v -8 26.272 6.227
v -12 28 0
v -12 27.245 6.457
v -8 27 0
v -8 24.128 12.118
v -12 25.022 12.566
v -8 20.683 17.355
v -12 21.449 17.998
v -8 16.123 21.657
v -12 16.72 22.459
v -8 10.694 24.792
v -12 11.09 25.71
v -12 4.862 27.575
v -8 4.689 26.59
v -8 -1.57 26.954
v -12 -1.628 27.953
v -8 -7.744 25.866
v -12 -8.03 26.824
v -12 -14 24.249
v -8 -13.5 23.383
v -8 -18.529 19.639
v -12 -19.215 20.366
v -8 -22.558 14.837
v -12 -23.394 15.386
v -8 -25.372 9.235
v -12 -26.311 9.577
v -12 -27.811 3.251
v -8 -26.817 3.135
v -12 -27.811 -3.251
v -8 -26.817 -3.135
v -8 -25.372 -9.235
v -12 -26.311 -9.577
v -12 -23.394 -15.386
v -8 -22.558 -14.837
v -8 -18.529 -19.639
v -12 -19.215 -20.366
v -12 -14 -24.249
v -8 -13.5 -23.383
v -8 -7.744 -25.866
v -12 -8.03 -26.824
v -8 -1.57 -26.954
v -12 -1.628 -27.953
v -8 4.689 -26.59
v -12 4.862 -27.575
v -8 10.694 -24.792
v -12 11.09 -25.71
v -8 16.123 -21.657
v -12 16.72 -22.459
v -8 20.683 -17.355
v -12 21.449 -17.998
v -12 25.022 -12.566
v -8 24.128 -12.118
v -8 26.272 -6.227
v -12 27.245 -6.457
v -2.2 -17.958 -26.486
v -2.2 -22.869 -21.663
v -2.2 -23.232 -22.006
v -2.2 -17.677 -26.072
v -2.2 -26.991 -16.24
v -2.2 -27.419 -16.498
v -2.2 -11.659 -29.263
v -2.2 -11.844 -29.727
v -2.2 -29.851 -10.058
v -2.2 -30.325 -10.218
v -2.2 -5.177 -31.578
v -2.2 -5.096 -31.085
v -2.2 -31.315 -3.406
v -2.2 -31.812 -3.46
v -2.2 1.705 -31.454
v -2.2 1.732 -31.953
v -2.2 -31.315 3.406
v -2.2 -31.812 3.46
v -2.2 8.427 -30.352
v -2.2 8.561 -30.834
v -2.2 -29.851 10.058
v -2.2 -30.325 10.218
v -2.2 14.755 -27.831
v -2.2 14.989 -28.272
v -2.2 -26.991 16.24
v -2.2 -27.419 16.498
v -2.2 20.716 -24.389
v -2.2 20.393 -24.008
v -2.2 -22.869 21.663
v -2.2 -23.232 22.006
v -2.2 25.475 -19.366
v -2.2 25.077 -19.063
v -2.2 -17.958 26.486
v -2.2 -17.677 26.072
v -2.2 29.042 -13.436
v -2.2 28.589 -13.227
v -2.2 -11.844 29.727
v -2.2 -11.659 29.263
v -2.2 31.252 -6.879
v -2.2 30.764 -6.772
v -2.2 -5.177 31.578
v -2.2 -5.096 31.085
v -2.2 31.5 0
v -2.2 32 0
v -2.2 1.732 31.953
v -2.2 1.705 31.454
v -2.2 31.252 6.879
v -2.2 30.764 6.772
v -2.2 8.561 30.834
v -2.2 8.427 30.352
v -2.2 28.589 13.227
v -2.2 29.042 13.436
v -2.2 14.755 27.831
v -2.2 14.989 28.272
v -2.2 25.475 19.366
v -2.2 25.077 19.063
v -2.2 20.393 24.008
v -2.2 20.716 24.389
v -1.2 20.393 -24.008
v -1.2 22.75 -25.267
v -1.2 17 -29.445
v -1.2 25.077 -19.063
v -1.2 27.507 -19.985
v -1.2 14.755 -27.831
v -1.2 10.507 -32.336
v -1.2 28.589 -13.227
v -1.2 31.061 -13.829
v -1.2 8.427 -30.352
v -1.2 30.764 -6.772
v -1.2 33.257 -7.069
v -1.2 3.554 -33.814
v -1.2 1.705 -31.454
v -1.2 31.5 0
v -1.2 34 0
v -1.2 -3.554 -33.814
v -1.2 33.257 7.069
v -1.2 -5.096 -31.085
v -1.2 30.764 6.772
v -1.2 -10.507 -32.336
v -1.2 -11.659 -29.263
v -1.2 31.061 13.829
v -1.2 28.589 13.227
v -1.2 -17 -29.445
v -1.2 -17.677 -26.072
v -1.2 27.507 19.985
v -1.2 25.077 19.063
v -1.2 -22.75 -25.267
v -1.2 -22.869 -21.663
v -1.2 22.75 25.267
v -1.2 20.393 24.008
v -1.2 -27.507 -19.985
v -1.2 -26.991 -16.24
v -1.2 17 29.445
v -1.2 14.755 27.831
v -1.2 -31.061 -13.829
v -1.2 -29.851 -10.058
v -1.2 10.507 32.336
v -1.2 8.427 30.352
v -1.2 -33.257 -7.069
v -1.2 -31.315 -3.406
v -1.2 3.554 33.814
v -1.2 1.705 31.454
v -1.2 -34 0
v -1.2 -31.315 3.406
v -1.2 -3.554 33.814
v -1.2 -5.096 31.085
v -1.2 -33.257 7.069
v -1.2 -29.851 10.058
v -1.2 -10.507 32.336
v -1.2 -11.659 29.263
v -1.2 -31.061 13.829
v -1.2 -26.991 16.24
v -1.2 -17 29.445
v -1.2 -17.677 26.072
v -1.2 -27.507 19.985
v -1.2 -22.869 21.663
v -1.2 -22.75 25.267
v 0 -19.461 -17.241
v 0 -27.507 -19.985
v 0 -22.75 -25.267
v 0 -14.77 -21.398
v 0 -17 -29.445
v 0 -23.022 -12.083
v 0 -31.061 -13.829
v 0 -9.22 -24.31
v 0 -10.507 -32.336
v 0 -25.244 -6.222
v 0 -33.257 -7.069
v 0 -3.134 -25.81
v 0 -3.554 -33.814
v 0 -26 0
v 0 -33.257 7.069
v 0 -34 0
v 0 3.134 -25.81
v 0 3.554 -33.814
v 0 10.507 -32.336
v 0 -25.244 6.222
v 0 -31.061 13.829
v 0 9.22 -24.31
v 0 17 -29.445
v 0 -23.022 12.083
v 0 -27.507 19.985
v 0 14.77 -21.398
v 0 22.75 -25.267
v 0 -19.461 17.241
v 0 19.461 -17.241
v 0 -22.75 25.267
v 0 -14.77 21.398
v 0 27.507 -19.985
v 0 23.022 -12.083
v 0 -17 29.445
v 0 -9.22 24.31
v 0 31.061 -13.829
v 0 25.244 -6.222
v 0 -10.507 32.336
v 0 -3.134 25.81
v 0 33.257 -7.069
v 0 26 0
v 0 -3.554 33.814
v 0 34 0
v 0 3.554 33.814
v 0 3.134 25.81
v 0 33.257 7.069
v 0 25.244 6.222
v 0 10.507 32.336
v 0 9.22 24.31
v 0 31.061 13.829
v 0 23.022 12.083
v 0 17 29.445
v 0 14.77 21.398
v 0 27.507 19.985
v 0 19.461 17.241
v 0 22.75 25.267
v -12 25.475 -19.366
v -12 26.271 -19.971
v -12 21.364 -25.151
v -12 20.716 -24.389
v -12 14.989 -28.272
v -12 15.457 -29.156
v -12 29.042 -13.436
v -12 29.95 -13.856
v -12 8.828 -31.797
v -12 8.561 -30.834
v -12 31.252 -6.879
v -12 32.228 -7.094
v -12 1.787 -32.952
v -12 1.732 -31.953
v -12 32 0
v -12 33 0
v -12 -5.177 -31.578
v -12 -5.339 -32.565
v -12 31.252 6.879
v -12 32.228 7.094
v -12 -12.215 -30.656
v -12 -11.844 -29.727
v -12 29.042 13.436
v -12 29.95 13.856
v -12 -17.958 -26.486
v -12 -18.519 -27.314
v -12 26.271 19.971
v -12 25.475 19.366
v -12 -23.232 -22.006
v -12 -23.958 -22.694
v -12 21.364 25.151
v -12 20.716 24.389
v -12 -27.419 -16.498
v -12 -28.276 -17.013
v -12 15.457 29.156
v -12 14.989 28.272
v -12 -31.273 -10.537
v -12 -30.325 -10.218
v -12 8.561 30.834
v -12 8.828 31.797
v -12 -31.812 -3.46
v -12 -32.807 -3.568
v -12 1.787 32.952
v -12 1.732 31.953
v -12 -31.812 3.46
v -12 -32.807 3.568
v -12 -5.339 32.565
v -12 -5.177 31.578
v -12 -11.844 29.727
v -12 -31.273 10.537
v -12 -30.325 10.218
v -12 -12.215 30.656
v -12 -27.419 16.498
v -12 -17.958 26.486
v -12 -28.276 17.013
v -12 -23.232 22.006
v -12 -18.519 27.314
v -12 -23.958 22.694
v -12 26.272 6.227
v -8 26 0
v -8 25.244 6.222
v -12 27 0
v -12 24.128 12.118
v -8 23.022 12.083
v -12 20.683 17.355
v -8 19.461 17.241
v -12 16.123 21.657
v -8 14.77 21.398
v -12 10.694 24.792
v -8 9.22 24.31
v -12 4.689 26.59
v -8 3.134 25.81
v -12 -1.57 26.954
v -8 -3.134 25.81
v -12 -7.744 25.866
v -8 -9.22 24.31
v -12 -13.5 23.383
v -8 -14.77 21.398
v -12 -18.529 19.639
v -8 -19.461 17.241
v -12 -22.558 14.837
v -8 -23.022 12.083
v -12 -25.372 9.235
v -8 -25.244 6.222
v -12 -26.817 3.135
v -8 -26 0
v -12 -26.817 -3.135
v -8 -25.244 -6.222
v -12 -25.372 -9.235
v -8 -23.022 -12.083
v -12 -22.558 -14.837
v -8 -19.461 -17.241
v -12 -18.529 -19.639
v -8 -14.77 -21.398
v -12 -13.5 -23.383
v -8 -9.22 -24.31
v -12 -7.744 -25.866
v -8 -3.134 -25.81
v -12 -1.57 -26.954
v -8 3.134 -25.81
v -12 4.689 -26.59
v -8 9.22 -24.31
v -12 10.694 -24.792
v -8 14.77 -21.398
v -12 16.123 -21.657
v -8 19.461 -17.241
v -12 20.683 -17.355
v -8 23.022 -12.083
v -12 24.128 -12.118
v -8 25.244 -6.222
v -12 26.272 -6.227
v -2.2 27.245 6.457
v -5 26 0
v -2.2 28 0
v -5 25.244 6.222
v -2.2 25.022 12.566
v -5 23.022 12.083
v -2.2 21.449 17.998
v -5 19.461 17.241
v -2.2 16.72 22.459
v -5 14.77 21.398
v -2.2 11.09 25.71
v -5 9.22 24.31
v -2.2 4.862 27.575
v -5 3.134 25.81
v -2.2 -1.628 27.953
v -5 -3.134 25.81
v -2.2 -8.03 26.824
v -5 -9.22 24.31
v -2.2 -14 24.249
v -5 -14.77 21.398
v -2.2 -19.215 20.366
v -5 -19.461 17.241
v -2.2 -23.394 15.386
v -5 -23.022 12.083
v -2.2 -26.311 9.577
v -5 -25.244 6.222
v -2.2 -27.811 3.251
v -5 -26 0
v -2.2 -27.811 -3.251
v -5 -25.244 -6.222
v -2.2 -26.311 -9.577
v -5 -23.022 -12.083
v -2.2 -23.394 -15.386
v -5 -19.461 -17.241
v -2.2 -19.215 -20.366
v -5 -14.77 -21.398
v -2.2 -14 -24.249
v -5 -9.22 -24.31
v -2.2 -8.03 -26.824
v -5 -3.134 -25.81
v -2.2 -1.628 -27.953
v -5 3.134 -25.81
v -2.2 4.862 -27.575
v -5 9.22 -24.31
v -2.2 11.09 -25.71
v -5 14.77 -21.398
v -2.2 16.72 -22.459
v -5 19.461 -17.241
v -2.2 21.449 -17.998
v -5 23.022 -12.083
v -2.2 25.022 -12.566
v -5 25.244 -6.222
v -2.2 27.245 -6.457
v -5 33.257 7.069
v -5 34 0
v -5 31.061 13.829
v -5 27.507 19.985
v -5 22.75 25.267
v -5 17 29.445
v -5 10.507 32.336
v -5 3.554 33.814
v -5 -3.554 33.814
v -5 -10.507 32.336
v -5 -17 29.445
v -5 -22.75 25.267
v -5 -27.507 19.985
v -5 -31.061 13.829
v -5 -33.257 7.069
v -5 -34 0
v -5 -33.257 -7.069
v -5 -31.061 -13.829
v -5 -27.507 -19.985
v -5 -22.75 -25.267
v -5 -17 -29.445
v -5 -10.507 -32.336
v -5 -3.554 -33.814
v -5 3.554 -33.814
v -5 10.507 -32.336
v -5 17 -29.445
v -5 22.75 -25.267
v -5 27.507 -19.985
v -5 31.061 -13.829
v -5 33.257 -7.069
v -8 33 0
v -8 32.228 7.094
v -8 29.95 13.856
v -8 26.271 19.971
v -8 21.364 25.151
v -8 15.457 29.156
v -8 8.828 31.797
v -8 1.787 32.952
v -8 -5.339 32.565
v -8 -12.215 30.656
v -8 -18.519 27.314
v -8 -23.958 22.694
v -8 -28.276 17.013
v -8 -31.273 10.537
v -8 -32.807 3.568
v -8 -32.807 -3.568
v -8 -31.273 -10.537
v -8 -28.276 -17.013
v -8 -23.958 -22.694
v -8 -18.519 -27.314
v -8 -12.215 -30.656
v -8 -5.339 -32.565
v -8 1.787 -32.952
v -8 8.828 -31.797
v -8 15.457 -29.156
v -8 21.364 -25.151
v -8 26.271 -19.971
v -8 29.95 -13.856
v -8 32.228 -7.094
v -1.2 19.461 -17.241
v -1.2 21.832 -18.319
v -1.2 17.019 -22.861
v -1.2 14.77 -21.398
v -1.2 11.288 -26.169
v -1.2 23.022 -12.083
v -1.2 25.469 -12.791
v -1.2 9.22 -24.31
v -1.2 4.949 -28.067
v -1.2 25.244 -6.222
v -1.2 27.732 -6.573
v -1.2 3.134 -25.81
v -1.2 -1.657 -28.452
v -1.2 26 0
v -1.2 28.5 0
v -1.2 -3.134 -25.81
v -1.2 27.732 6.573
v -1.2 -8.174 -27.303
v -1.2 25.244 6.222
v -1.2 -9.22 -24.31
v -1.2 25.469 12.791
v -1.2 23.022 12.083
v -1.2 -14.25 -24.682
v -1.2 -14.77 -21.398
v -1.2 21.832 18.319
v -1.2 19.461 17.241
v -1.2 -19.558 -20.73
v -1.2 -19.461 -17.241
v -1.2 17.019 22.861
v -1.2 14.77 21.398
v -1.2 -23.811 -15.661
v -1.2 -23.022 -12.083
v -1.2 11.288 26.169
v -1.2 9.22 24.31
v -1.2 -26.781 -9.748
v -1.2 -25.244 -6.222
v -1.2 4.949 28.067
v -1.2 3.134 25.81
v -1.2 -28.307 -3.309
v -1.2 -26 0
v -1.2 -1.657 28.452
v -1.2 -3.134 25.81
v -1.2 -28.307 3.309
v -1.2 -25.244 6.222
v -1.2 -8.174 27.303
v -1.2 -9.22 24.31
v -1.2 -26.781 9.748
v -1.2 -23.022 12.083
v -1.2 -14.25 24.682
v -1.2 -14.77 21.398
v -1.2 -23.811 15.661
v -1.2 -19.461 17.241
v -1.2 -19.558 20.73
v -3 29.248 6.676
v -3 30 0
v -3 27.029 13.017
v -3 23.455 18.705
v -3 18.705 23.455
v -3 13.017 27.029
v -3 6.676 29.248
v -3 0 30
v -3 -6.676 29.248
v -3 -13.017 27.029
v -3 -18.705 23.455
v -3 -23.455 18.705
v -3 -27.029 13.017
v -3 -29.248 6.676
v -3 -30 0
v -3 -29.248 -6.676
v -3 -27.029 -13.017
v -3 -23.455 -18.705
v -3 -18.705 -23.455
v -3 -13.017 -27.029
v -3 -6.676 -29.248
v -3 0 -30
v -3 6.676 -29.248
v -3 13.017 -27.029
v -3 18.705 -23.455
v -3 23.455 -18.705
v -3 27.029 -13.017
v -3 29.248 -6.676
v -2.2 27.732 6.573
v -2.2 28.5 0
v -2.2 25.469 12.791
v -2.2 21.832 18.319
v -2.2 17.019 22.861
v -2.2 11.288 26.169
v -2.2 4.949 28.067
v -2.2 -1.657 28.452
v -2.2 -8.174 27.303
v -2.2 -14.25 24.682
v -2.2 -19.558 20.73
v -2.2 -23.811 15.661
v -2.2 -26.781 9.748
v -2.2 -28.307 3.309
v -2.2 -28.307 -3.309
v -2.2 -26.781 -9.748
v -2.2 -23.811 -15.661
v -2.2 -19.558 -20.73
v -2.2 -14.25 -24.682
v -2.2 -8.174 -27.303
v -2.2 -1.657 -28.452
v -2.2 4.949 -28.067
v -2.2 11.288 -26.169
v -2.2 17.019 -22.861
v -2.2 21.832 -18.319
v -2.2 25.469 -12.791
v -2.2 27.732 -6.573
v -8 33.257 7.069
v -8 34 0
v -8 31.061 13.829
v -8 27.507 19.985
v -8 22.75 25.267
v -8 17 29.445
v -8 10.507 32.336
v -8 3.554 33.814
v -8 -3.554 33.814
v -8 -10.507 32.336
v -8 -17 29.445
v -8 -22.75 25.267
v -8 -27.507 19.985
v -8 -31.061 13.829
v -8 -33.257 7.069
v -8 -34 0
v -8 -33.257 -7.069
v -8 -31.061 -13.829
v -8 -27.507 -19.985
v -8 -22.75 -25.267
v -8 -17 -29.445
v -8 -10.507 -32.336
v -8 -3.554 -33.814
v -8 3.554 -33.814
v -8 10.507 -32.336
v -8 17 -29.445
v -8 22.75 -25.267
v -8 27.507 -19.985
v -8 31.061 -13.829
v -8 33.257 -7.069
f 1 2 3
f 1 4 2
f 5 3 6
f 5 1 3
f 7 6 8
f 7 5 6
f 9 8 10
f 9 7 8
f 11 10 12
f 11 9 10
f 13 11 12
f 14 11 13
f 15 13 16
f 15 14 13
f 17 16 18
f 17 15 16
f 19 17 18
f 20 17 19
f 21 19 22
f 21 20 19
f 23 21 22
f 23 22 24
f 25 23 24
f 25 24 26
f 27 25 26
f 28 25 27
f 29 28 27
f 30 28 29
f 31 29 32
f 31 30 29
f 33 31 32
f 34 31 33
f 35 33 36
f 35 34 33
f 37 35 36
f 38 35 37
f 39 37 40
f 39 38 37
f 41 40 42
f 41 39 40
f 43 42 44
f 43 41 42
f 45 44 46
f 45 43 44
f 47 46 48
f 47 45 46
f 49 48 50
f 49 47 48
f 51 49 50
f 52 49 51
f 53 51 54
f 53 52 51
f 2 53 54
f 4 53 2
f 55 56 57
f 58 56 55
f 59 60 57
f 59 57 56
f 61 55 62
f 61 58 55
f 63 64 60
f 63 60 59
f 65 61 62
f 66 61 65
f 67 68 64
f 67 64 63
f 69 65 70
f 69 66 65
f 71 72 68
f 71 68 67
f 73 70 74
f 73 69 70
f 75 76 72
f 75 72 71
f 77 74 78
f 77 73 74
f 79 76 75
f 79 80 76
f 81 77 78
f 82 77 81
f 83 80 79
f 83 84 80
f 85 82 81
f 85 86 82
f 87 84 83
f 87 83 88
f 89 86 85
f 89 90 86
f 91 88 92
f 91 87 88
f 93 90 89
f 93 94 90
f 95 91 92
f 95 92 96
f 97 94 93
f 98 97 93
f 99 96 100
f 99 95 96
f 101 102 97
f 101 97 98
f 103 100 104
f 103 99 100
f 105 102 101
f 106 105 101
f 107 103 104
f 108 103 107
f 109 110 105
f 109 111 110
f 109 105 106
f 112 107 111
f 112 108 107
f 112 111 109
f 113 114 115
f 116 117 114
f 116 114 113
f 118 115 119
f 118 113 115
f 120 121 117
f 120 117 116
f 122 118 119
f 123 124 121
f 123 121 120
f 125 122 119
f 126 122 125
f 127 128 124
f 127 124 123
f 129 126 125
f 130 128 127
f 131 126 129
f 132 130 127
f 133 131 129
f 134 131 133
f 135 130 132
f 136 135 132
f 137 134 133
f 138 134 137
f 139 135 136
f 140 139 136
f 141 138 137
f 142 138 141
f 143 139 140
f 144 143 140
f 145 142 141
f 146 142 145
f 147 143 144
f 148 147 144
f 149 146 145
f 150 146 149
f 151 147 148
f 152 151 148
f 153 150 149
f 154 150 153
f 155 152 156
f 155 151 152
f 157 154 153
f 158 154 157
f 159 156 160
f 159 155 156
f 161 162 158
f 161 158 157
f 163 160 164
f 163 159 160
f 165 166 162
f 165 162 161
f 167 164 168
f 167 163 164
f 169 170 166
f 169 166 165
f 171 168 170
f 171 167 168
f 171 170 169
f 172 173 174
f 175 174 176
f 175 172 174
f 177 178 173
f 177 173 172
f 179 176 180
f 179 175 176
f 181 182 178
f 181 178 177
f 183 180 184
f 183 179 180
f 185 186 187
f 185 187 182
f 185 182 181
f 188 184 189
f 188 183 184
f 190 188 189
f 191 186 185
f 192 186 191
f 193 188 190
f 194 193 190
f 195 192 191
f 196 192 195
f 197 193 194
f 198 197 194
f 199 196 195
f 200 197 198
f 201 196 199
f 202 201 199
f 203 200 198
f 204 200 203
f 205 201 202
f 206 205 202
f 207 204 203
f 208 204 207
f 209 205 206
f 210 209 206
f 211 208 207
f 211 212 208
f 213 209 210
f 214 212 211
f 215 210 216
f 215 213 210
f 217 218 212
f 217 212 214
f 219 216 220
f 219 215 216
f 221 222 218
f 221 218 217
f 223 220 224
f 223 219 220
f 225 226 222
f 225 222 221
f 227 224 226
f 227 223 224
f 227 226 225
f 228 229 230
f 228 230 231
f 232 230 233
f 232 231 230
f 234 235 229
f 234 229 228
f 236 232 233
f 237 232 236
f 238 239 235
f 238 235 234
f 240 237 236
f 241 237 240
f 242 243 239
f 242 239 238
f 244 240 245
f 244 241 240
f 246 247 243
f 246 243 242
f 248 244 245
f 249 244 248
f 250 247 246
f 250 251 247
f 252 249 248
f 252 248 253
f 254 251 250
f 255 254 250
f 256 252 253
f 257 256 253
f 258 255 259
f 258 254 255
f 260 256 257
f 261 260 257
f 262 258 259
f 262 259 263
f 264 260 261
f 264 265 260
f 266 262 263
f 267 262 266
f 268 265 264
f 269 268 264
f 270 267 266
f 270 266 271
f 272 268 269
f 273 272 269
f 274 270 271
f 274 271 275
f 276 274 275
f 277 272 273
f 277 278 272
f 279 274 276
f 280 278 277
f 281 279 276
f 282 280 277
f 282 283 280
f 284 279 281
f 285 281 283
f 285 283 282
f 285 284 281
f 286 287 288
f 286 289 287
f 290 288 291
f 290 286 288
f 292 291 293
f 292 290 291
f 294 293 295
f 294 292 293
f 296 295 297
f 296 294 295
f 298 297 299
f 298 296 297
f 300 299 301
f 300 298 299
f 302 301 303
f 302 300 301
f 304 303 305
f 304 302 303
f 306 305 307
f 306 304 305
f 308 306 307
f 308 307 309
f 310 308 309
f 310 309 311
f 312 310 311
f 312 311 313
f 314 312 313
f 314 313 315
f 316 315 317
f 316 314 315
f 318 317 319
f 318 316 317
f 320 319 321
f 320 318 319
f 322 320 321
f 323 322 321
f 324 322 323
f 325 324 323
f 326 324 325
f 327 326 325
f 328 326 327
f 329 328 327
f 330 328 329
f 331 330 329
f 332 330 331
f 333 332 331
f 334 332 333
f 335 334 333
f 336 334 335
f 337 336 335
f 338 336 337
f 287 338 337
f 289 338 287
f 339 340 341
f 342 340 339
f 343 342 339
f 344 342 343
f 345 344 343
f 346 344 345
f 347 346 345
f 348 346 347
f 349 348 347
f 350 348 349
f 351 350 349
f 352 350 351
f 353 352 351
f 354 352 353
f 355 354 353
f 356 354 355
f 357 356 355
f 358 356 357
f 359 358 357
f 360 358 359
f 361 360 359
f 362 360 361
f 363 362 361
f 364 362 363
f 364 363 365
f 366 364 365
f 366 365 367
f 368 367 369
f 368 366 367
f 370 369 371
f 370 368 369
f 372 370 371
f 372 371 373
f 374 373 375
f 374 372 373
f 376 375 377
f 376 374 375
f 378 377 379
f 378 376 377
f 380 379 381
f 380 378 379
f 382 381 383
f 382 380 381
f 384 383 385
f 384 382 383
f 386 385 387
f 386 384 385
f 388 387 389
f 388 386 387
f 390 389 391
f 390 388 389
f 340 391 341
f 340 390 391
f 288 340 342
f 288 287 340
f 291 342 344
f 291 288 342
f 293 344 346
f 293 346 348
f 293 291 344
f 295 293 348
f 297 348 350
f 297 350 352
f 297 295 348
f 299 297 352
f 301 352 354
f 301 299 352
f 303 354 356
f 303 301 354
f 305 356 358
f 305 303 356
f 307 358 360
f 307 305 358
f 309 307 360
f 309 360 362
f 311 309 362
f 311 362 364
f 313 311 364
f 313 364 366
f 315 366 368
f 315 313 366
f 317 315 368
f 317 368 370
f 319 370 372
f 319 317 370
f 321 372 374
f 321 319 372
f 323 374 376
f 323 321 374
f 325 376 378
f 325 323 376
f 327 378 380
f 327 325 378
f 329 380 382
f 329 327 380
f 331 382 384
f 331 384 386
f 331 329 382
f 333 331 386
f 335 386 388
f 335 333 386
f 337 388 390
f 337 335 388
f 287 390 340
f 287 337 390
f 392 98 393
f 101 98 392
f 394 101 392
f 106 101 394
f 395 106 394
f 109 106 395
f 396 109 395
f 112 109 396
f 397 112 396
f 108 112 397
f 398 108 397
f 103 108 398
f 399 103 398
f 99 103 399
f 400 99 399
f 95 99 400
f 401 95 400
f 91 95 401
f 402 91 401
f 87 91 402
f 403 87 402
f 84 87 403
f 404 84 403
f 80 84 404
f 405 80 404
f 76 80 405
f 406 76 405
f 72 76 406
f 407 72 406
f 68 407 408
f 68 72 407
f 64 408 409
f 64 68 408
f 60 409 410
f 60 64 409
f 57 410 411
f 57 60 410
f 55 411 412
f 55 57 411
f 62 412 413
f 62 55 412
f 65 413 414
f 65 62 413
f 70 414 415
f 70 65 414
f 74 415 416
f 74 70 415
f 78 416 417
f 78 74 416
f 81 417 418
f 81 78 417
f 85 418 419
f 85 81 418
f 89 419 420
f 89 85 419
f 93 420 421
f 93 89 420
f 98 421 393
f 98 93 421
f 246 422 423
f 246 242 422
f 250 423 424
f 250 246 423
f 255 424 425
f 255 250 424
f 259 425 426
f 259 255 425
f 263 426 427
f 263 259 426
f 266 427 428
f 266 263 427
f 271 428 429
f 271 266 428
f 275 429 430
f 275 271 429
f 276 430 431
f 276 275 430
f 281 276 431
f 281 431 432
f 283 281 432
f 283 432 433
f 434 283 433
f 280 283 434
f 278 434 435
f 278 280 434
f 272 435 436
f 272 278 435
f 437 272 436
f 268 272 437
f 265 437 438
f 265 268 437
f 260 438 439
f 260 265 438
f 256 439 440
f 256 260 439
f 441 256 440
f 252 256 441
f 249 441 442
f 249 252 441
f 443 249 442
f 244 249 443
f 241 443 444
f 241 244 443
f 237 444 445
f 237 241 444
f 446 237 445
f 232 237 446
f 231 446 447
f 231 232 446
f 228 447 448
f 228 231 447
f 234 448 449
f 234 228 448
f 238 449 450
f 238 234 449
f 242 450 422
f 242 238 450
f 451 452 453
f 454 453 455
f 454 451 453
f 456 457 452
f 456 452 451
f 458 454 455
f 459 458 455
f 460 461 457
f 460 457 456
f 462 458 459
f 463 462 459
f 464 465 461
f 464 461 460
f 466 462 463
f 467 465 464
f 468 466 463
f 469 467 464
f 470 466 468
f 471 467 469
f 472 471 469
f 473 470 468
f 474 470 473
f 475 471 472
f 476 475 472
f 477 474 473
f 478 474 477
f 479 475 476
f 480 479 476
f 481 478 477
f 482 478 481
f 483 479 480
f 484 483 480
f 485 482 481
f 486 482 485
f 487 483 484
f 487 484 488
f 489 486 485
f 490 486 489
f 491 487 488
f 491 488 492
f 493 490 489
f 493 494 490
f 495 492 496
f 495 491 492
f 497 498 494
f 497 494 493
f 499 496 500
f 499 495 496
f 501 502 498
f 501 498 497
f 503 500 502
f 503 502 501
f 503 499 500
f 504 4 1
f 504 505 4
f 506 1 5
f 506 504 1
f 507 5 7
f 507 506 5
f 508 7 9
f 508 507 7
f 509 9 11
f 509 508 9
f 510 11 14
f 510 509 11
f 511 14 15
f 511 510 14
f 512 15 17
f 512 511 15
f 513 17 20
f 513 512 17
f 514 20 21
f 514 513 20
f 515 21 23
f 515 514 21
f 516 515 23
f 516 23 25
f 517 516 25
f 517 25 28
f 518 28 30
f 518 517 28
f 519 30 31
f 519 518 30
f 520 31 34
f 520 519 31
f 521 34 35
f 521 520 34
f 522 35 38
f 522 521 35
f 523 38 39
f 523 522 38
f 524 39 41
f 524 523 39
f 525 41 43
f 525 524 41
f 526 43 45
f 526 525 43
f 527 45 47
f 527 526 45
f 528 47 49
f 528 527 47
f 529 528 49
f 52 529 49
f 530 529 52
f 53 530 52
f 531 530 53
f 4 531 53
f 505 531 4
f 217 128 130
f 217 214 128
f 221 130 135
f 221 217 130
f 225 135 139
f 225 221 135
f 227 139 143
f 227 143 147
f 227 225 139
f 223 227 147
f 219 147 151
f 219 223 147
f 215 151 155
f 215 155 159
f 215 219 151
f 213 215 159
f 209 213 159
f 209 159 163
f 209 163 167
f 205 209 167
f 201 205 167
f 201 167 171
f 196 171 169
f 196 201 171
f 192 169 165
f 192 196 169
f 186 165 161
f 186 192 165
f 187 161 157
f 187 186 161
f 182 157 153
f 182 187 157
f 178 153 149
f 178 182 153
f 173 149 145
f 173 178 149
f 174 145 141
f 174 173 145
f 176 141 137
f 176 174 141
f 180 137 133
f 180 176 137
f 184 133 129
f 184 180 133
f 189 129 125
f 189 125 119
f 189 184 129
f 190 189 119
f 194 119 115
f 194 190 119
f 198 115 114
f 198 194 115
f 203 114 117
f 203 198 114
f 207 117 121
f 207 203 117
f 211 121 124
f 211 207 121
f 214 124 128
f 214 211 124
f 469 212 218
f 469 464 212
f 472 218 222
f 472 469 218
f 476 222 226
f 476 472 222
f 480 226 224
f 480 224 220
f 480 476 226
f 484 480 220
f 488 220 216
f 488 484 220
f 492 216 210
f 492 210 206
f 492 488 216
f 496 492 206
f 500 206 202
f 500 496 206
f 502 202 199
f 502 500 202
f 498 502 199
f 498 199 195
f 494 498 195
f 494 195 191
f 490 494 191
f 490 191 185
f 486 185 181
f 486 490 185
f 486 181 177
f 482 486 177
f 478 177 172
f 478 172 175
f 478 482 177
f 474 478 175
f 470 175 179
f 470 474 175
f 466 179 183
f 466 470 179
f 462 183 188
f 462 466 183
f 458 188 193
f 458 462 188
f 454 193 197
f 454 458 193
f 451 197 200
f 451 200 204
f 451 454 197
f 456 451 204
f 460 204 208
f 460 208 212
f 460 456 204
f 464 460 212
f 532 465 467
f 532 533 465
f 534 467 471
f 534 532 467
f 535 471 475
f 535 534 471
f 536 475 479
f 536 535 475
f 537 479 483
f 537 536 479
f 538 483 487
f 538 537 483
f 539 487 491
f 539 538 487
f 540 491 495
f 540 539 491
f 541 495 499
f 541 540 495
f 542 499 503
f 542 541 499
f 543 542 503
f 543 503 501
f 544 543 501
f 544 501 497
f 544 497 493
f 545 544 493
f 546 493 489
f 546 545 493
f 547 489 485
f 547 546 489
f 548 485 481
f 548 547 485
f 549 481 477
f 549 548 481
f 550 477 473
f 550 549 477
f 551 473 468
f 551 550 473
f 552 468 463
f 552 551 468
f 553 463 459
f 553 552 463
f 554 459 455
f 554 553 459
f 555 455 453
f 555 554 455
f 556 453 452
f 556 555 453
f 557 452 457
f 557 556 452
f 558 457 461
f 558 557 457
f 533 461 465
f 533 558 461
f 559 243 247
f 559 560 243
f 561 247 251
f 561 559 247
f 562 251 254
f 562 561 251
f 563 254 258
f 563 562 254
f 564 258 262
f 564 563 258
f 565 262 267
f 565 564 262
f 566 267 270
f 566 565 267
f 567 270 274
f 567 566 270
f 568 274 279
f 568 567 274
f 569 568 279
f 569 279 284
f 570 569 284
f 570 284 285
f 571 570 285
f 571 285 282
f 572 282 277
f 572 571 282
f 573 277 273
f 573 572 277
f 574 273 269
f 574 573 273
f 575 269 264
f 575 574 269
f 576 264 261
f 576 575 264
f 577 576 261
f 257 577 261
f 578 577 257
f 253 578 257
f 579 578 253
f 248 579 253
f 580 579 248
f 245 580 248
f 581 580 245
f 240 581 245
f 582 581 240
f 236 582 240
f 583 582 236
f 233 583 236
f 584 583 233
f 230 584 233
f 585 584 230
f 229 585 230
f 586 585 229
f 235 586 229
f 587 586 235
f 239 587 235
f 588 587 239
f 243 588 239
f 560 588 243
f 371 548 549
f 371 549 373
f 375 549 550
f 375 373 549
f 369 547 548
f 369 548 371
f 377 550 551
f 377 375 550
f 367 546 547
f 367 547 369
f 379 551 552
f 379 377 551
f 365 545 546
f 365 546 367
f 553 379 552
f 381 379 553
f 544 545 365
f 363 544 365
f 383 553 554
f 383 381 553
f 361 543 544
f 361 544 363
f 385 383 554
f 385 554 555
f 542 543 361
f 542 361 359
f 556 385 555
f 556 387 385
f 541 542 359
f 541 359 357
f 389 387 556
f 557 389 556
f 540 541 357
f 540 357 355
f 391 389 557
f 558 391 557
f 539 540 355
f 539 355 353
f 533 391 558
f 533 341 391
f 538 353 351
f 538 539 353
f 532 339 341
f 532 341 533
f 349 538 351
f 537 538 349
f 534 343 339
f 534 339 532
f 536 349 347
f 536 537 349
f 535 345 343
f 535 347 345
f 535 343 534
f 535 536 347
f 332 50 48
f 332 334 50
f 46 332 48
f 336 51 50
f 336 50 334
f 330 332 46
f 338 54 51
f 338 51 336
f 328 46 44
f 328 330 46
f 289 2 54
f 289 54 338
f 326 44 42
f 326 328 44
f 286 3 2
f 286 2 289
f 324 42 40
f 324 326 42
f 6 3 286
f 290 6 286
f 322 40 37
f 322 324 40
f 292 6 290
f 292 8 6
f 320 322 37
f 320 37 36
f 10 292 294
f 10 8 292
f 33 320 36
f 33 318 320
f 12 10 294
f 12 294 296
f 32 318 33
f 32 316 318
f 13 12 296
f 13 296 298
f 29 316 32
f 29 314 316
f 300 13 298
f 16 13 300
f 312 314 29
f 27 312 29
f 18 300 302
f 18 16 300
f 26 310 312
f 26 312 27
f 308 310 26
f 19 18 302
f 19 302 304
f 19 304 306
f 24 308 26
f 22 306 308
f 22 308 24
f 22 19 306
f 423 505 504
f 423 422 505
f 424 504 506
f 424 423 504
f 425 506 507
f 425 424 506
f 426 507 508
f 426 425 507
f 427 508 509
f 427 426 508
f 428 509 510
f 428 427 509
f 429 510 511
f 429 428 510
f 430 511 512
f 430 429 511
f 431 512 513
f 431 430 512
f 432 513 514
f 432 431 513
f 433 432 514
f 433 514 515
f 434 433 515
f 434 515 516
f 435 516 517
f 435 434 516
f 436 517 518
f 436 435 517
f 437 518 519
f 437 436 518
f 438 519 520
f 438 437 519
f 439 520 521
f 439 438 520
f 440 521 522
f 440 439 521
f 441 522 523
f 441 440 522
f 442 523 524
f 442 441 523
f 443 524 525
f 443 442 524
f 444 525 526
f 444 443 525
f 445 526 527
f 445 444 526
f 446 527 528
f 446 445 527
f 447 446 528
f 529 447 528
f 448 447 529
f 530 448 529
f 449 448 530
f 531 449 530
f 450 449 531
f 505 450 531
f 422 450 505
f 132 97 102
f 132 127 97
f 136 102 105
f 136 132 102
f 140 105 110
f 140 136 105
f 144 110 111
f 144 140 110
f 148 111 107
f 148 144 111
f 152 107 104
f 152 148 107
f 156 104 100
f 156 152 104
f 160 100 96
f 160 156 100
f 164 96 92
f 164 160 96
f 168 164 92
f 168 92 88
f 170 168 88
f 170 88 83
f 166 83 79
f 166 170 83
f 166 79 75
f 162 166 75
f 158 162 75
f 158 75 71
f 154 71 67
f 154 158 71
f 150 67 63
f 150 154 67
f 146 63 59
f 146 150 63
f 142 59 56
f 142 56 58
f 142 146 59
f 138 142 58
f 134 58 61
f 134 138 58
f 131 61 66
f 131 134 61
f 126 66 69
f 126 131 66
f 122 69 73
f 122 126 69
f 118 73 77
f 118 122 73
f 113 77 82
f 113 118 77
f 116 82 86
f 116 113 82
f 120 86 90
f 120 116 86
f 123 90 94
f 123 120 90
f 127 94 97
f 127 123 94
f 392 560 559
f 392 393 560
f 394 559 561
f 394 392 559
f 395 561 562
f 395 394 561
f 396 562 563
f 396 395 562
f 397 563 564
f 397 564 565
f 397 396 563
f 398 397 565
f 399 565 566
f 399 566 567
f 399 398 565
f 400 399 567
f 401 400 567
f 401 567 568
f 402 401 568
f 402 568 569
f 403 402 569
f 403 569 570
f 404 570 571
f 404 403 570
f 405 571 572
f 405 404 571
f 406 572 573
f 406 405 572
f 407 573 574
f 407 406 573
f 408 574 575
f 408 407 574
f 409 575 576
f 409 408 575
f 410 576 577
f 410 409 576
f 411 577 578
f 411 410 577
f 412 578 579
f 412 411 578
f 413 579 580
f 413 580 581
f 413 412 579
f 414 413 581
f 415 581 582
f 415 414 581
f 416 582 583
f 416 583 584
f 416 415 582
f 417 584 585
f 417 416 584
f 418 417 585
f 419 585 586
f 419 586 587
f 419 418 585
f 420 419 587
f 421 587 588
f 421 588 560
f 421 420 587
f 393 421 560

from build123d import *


with BuildPart() as part:
    # Sketch1 → Revolve2 (revolve)
    with BuildSketch(Plane.XY):
        Polygon((0, 34), (0, 26), (-1.2, 26), (-1.2, 28.5), (-2.2, 28.5), (-2.2, 28), (-5, 26), (-8, 26), (-12, 27), (-12, 28), (-8, 27), (-3, 30), (-8, 33), (-12, 32), (-12, 33), (-8, 34), (-5, 34), (-2.2, 32), (-2.2, 31.5), (-1.2, 31.5), (-1.2, 34), align=None)
    revolve(axis=Axis((-63.826580298, 0, 0), (1, 0, 0)))


solid = part.part
